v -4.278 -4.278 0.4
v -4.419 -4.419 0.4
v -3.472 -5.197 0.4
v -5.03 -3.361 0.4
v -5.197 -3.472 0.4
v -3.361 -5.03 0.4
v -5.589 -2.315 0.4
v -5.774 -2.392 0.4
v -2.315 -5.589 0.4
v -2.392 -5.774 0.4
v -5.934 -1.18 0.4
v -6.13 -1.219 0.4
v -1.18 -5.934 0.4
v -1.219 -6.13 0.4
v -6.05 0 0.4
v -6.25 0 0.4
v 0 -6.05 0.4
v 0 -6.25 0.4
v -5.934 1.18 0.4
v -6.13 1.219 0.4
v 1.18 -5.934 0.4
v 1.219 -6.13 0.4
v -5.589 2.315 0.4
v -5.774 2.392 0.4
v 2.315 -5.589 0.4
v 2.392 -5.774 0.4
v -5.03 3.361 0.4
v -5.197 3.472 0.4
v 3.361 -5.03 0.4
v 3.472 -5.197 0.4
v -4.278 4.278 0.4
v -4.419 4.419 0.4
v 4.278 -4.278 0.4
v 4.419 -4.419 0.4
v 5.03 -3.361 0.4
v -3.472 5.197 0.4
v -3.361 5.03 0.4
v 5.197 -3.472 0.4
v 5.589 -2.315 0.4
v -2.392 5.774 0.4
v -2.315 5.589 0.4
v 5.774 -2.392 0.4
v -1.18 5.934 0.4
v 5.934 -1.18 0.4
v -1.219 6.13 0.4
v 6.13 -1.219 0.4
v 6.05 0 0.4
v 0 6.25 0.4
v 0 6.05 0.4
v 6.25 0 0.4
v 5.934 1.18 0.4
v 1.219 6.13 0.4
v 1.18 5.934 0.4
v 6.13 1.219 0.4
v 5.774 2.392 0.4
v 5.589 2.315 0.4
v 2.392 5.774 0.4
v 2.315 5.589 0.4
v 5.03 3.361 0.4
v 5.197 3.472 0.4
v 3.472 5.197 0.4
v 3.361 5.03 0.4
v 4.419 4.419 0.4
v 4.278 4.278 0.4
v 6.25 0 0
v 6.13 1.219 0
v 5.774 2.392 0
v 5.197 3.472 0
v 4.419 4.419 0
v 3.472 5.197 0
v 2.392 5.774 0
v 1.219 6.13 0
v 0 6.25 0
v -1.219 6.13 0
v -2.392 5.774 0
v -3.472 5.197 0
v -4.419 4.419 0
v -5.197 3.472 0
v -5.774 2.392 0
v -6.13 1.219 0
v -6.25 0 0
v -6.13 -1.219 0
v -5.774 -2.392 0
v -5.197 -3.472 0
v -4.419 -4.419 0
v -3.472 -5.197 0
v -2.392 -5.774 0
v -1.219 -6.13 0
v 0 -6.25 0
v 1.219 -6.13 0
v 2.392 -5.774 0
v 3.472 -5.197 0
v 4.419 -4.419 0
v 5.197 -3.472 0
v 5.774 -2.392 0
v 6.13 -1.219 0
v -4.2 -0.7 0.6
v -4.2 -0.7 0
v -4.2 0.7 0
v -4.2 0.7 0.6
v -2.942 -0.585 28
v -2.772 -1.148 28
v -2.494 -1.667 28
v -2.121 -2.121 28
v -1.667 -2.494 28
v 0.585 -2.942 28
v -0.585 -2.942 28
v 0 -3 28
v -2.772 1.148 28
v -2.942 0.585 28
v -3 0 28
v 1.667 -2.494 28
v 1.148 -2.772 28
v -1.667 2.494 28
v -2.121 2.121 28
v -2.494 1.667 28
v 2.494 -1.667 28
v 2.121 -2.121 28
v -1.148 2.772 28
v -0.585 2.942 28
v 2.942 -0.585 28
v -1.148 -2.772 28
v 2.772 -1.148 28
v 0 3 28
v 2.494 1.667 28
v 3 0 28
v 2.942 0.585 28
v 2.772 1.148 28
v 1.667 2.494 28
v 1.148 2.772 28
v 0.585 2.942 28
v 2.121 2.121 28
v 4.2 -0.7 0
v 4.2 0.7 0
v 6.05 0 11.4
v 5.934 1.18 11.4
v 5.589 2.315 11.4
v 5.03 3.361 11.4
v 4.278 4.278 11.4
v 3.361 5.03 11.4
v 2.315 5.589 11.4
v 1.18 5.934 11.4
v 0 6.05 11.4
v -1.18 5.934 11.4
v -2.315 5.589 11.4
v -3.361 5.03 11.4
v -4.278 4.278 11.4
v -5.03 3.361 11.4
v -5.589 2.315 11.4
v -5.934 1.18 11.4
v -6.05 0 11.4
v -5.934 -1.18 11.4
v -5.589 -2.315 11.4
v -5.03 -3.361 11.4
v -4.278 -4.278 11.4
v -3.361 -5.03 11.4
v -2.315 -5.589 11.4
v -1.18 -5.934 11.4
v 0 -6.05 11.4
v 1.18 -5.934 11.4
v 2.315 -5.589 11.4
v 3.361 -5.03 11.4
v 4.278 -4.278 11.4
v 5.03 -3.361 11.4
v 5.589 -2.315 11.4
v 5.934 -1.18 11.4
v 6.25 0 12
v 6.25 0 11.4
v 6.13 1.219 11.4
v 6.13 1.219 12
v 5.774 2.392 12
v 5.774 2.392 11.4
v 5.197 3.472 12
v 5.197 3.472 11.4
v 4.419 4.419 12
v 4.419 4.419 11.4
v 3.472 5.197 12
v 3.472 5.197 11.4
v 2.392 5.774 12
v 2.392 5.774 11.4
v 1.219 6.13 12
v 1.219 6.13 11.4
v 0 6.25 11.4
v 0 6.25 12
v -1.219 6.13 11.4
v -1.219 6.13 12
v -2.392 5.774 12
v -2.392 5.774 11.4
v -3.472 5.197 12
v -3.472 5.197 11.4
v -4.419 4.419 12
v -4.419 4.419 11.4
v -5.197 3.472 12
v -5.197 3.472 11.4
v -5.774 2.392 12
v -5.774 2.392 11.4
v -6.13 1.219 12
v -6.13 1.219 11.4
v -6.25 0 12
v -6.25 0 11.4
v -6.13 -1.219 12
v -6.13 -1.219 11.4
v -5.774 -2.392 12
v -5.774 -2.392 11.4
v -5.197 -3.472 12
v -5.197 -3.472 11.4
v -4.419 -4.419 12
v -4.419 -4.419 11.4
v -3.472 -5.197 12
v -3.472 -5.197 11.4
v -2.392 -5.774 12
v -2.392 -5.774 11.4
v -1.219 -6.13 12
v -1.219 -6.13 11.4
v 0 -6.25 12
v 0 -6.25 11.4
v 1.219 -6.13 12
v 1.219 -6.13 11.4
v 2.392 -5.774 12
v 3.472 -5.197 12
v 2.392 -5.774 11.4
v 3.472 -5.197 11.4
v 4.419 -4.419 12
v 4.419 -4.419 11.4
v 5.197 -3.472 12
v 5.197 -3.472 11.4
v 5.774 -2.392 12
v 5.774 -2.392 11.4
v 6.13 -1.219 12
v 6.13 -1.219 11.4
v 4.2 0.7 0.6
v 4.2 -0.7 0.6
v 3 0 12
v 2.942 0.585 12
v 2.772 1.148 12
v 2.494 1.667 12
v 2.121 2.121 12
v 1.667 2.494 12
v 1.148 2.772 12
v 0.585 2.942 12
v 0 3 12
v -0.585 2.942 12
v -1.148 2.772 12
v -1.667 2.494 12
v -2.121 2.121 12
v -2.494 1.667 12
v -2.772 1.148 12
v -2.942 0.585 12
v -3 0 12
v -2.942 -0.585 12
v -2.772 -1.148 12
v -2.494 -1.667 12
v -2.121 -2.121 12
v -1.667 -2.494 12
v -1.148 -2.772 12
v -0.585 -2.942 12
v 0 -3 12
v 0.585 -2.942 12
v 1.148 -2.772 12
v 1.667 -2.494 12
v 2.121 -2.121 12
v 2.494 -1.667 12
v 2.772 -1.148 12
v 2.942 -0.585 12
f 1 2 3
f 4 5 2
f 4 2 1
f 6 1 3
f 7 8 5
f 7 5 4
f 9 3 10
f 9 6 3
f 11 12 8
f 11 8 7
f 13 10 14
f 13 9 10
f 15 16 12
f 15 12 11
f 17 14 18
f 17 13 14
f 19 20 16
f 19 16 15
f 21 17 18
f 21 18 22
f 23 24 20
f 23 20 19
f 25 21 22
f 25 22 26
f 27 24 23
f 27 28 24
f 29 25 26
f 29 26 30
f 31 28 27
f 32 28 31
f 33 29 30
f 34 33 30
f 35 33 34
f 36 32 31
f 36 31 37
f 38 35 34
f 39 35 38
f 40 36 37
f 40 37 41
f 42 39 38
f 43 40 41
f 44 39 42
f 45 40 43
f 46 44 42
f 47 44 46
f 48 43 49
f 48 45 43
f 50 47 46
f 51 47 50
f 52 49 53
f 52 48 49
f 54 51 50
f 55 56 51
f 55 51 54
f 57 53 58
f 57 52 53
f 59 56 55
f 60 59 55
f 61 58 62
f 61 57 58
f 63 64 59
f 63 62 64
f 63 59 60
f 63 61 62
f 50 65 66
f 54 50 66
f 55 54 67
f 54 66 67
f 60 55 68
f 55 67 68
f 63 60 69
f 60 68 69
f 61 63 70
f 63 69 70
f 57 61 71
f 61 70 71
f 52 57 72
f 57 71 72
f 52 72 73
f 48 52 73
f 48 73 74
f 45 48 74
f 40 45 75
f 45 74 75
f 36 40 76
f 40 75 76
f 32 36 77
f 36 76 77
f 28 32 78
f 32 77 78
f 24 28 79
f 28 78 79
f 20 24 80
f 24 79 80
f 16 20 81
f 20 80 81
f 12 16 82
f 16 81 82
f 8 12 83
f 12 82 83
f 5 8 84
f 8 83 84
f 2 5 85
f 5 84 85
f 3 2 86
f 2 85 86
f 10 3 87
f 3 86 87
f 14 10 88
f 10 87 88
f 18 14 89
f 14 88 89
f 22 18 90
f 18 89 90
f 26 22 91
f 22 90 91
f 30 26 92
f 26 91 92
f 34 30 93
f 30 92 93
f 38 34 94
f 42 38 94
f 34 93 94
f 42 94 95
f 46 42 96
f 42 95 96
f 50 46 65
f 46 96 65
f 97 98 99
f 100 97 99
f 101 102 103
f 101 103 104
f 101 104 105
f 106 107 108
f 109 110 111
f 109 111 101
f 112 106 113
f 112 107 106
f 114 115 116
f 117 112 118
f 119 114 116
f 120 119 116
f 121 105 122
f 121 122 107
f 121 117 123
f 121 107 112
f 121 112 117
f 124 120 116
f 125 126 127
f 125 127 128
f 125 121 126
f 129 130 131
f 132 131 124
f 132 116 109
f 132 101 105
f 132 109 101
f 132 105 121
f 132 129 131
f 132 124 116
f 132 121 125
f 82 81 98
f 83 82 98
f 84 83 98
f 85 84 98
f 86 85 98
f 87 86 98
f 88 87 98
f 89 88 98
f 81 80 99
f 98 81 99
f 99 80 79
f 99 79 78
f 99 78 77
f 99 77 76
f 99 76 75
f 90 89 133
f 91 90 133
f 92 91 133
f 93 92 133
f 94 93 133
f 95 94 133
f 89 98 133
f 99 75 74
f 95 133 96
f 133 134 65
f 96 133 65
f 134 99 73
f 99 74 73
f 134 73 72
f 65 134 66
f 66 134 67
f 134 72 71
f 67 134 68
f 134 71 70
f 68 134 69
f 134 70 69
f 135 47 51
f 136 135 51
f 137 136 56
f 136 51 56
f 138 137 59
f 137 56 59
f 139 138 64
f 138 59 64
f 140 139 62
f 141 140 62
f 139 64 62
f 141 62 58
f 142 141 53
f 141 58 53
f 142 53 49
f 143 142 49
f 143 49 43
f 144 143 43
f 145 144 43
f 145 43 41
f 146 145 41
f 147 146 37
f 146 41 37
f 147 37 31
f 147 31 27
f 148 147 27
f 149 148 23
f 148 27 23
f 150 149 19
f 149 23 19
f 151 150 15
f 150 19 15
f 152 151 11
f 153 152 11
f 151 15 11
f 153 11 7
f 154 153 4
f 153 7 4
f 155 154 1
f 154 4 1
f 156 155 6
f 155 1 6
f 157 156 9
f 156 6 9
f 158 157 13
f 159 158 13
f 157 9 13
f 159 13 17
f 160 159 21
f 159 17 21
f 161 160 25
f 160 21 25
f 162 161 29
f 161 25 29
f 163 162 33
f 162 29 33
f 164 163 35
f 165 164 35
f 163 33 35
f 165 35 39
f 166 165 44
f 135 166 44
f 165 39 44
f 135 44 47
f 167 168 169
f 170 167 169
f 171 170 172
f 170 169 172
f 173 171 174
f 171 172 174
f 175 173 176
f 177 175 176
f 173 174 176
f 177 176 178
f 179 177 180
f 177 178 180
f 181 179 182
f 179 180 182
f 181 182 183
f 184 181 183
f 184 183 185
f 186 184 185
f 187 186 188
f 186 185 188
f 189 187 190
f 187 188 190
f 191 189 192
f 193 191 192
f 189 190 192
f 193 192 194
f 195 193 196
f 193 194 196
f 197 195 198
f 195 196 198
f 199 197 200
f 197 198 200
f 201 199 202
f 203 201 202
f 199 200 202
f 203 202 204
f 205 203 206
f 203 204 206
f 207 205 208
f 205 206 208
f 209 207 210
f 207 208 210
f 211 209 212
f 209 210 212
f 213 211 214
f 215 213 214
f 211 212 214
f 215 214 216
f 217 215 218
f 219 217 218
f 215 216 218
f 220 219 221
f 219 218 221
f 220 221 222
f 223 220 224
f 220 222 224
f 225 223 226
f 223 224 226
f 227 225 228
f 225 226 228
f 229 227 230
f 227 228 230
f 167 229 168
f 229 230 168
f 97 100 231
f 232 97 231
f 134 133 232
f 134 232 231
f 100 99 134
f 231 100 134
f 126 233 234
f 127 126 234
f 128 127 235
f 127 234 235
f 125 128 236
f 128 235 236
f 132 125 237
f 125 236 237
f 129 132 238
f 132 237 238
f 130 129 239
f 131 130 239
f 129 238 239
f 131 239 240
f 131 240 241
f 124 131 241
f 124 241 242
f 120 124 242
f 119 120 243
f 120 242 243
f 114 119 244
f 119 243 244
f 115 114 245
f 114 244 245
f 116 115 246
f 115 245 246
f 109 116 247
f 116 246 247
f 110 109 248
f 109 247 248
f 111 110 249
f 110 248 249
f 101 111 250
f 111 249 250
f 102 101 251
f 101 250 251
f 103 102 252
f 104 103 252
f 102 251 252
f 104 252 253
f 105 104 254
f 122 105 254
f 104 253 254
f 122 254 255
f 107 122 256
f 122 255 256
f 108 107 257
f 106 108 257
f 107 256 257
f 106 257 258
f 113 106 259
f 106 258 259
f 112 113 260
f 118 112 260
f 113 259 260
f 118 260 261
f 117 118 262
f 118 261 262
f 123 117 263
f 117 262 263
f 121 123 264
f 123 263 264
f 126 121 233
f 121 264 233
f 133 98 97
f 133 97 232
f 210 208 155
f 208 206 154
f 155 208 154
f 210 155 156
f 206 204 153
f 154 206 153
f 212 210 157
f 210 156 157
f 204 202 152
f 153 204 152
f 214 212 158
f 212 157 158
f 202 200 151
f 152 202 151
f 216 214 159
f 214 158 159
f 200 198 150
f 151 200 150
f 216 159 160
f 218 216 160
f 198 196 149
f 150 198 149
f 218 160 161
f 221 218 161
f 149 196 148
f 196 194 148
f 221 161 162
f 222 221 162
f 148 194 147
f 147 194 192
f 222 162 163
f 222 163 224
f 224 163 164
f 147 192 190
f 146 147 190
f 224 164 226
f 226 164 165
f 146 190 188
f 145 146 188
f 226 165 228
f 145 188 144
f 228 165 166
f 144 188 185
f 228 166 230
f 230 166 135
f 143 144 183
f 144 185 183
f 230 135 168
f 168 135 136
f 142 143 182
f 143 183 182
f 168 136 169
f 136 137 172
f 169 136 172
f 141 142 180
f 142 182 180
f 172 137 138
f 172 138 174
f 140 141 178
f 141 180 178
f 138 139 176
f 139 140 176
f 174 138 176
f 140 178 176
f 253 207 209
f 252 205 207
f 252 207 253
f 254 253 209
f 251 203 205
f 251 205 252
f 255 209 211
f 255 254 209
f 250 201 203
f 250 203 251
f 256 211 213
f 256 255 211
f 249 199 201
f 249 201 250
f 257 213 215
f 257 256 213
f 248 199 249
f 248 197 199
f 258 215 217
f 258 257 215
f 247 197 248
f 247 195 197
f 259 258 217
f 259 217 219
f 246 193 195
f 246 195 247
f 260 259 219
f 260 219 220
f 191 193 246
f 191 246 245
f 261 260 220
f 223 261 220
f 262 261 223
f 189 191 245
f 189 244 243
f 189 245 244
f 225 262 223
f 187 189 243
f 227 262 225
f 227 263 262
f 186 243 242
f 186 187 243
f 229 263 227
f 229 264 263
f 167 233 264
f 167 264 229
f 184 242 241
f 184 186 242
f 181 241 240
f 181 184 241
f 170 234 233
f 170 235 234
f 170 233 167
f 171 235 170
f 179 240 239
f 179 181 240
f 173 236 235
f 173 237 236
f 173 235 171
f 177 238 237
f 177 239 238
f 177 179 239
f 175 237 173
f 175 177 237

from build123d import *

# Parameters (mm, degrees)
S01_RETAINING_FLANGE_R                         = 6.25
F_01_RETAINING_FLANGE_DEPTH                    = 0.4
F_02_START                                     = 0.4
S02_INNER_RACE_AND_SEALED_ROLLING_ASSE_R       = 6.05
F_02_INNER_RACE_AND_SEALED_ROLLING_ASSEM_DEPTH = 11
F_03_START                                     = 11.4
S03_MOUNTING_THRUST_FACE_R                     = 6.25
F_03_MOUNTING_THRUST_FACE_DEPTH                = 0.6
F_04_START                                     = 12
S04_SIX_MILLIMETRE_STUD_WITH_FINAL_8_M_R       = 3
F_04_SIX_MILLIMETRE_STUD_WITH_FINAL_8_MM_DEPTH = 16
F_05_START                                     = -0.1
S05_ASSEMBLY_DRIVE_SLOT_W                      = 8.4
S05_ASSEMBLY_DRIVE_SLOT_H                      = 1.4
F_05_ASSEMBLY_DRIVE_SLOT_DEPTH                 = 0.7


with BuildPart() as part:
    # S01 - Retaining flange → 01 - Retaining flange (new body)
    with BuildSketch(Plane.XY):
        Circle(S01_RETAINING_FLANGE_R)
    extrude(amount=F_01_RETAINING_FLANGE_DEPTH)

    # S02 - Inner race and sealed rolling assembly envelope → 02 - Inner race and sealed rolling assembly envelope (add)
    with BuildSketch(Plane.XY.offset(F_02_START)):
        Circle(S02_INNER_RACE_AND_SEALED_ROLLING_ASSE_R)
    extrude(amount=F_02_INNER_RACE_AND_SEALED_ROLLING_ASSEM_DEPTH)

    # S03 - Mounting thrust face → 03 - Mounting thrust face (add)
    with BuildSketch(Plane.XY.offset(F_03_START)):
        Circle(S03_MOUNTING_THRUST_FACE_R)
    extrude(amount=F_03_MOUNTING_THRUST_FACE_DEPTH)

    # S04 - Six millimetre stud with final 8 mm M6 thread envelope → 04 - Six millimetre stud with final 8 mm M6 thread envelope (add)
    with BuildSketch(Plane.XY.offset(F_04_START)):
        Circle(S04_SIX_MILLIMETRE_STUD_WITH_FINAL_8_M_R)
    extrude(amount=F_04_SIX_MILLIMETRE_STUD_WITH_FINAL_8_MM_DEPTH)

    # S05 - Assembly drive slot → 05 - Assembly drive slot (cut)
    with BuildSketch(Plane.XY.offset(F_05_START)):
        Rectangle(S05_ASSEMBLY_DRIVE_SLOT_W, S05_ASSEMBLY_DRIVE_SLOT_H)
    extrude(amount=F_05_ASSEMBLY_DRIVE_SLOT_DEPTH, mode=Mode.SUBTRACT)


solid = part.part
